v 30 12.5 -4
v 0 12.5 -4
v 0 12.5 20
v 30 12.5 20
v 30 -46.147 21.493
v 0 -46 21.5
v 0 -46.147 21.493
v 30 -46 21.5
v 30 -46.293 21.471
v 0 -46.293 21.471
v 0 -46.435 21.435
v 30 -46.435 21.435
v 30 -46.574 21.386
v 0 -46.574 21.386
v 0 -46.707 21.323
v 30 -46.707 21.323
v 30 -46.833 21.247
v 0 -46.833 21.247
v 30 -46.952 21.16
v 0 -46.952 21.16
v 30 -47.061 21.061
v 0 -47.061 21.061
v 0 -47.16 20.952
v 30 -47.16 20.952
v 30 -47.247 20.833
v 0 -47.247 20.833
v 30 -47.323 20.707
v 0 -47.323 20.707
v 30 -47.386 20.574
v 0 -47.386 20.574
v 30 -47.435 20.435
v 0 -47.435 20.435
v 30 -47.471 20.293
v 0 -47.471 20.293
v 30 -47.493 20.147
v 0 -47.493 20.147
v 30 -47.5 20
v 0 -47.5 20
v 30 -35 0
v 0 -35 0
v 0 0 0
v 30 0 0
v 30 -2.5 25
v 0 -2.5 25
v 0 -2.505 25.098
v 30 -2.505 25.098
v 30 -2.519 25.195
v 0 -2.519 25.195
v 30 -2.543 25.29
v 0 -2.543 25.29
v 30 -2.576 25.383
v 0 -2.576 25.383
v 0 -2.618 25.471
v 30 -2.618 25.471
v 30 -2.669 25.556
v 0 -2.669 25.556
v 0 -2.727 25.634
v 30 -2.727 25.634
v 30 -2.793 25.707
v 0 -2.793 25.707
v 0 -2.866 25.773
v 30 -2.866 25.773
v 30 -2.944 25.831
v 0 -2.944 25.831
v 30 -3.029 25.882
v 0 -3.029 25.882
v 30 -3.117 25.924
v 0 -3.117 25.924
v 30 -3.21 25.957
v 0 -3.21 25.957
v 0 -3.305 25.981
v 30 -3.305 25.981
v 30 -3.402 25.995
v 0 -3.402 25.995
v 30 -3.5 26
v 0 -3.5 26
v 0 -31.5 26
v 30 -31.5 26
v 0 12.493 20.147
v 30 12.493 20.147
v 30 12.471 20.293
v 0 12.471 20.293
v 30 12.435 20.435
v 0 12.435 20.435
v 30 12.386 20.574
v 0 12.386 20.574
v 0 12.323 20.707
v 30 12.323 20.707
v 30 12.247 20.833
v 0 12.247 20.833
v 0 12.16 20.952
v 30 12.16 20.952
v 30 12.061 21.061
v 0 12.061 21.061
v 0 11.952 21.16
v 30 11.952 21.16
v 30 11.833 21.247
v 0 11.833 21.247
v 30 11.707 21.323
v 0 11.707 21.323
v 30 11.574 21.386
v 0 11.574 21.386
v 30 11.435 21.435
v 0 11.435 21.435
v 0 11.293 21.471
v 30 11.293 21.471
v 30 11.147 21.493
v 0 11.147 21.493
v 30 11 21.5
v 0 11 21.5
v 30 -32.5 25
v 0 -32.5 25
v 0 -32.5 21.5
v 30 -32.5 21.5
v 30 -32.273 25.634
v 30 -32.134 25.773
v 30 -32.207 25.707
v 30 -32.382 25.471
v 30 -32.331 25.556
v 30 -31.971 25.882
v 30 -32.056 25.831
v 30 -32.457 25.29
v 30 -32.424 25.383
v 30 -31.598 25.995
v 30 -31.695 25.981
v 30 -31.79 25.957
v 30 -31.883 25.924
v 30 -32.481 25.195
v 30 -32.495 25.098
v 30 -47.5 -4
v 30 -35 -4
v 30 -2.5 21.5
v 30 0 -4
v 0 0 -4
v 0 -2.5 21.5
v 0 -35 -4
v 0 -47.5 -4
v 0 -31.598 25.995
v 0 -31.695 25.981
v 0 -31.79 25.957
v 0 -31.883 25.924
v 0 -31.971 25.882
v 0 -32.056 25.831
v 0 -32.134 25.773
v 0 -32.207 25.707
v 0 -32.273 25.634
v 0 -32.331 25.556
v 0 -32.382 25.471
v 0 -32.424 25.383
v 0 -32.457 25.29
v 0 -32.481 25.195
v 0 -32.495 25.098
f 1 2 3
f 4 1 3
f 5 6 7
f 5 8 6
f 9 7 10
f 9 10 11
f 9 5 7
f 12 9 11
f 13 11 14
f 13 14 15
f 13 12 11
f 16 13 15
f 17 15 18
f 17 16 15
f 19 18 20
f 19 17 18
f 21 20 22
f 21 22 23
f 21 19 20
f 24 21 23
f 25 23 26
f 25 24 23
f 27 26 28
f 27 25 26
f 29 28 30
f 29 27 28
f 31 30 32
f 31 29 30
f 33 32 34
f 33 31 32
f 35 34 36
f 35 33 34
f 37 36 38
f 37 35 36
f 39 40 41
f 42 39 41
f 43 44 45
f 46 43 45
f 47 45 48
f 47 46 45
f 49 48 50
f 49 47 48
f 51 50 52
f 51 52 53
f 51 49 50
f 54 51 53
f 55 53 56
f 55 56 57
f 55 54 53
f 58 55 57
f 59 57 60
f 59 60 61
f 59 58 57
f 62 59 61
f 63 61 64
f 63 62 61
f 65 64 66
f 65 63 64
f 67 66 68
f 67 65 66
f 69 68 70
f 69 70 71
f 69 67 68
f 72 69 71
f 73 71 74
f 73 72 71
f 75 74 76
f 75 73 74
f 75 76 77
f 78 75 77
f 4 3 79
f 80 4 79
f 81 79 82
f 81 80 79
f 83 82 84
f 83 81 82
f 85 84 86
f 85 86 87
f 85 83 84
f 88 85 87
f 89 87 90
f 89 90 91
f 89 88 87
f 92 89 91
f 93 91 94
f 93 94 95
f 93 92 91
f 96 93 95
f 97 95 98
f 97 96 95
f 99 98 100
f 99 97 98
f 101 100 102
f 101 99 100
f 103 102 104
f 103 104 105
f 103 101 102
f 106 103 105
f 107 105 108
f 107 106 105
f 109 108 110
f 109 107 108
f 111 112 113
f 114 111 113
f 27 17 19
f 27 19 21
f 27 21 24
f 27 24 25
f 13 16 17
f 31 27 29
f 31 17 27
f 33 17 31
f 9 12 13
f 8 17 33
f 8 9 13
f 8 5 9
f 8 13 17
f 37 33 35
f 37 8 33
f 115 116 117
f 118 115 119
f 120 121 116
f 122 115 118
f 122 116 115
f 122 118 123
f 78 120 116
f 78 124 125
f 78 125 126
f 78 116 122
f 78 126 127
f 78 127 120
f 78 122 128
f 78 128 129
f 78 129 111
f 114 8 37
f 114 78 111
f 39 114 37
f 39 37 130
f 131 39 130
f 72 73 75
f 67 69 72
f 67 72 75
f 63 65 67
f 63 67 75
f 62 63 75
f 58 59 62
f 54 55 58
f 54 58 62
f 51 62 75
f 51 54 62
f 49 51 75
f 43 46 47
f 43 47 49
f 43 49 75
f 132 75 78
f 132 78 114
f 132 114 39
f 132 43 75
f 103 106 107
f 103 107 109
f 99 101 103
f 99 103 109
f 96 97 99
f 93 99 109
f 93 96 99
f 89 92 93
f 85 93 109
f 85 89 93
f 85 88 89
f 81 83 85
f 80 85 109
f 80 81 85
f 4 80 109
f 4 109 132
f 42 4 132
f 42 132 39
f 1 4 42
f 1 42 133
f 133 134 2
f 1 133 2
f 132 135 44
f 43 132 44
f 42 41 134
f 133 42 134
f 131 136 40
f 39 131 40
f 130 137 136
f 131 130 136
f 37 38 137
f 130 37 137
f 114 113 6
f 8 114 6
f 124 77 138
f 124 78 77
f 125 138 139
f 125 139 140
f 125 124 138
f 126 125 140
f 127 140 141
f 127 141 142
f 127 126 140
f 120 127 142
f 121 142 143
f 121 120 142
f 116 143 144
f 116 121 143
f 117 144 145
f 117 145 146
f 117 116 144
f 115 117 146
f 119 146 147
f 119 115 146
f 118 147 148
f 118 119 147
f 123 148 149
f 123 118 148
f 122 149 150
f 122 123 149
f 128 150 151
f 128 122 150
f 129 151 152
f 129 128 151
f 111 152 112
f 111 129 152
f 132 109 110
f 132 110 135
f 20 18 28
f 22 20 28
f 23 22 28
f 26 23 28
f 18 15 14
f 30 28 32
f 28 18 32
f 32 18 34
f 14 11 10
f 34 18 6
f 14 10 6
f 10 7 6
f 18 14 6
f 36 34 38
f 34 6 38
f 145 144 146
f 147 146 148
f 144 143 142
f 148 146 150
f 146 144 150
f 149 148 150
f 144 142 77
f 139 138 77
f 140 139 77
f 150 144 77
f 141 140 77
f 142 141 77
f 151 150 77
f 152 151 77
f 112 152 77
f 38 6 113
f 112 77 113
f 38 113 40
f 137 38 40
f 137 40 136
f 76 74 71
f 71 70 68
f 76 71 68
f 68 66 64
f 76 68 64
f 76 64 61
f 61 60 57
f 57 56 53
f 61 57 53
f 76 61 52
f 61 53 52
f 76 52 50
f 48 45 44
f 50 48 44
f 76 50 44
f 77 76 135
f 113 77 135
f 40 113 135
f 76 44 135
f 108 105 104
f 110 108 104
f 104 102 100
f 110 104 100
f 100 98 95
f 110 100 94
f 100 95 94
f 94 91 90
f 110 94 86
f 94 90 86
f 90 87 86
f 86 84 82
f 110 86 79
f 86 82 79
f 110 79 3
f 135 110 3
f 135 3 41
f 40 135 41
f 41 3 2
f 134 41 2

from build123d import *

# Parameters (mm, degrees)
EW_EXTRUDE_DEPTH = 30
FILLET1_R        = 1.5
FILLET2_R        = 1


with BuildPart() as part:
    # EW_SKETCH → EW_EXTRUDE (new body)
    with BuildSketch(Plane(origin=(0, 0, 0), x_dir=(0, 0, -1), z_dir=(1, 0, 0))):
        Polygon((0, 0), (4, 0), (4, 12.5), (-21.5, 12.5), (-21.5, -2.5), (-26, -2.5), (-26, -32.5), (-21.5, -32.5), (-21.5, -47.5), (4, -47.5), (4, -35), (0, -35), align=None)
    extrude(amount=EW_EXTRUDE_DEPTH)

    # fillet1
    fillet1_edges = [part.edges().sort_by_distance(p)[0] for p in [
        (15, -47.5, 21.5),
        (15, 12.5, 21.5),
    ]]
    fillet(fillet1_edges, radius=FILLET1_R)

    # fillet2
    fillet2_edges = [part.edges().sort_by_distance(p)[0] for p in [
        (15, -32.5, 26),
        (15, -2.5, 26),
    ]]
    fillet(fillet2_edges, radius=FILLET2_R)


solid = part.part
